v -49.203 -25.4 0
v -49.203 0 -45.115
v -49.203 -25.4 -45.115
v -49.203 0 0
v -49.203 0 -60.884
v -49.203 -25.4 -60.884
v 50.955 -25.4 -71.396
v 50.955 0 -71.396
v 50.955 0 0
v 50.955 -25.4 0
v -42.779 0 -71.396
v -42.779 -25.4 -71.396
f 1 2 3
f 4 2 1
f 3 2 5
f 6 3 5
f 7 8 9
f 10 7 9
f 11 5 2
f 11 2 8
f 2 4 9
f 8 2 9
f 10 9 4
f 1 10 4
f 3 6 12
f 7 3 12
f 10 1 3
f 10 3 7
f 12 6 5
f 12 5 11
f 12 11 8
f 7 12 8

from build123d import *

# Parameters (mm, degrees)
F0_W     = 14.016353
F0_H     = 45.115132
F1_DEPTH = 25.4


with BuildPart() as f1:
    # F0 (on Front) → F1 (new body)
    with BuildSketch(Plane.XZ):
        with Locations((-42.195055, -22.557566)):
            Rectangle(F0_W, F0_H)
        Polygon((-35.186879, -45.115132), (-49.203232, -45.115132), (-49.203232, -60.883522), (33.434838, -60.883522), (33.434838, 0), (-35.186879, 0), align=None)
        Polygon((33.434838, -60.883522), (-49.203232, -60.883522), (-42.779069, -71.395785), (33.434838, -71.395785), align=None)
        Polygon((50.955273, 0), (33.434838, 0), (33.434838, -60.883522), (33.434838, -71.395785), (50.955273, -71.395785), align=None)
    extrude(amount=F1_DEPTH)


solid = f1.part
